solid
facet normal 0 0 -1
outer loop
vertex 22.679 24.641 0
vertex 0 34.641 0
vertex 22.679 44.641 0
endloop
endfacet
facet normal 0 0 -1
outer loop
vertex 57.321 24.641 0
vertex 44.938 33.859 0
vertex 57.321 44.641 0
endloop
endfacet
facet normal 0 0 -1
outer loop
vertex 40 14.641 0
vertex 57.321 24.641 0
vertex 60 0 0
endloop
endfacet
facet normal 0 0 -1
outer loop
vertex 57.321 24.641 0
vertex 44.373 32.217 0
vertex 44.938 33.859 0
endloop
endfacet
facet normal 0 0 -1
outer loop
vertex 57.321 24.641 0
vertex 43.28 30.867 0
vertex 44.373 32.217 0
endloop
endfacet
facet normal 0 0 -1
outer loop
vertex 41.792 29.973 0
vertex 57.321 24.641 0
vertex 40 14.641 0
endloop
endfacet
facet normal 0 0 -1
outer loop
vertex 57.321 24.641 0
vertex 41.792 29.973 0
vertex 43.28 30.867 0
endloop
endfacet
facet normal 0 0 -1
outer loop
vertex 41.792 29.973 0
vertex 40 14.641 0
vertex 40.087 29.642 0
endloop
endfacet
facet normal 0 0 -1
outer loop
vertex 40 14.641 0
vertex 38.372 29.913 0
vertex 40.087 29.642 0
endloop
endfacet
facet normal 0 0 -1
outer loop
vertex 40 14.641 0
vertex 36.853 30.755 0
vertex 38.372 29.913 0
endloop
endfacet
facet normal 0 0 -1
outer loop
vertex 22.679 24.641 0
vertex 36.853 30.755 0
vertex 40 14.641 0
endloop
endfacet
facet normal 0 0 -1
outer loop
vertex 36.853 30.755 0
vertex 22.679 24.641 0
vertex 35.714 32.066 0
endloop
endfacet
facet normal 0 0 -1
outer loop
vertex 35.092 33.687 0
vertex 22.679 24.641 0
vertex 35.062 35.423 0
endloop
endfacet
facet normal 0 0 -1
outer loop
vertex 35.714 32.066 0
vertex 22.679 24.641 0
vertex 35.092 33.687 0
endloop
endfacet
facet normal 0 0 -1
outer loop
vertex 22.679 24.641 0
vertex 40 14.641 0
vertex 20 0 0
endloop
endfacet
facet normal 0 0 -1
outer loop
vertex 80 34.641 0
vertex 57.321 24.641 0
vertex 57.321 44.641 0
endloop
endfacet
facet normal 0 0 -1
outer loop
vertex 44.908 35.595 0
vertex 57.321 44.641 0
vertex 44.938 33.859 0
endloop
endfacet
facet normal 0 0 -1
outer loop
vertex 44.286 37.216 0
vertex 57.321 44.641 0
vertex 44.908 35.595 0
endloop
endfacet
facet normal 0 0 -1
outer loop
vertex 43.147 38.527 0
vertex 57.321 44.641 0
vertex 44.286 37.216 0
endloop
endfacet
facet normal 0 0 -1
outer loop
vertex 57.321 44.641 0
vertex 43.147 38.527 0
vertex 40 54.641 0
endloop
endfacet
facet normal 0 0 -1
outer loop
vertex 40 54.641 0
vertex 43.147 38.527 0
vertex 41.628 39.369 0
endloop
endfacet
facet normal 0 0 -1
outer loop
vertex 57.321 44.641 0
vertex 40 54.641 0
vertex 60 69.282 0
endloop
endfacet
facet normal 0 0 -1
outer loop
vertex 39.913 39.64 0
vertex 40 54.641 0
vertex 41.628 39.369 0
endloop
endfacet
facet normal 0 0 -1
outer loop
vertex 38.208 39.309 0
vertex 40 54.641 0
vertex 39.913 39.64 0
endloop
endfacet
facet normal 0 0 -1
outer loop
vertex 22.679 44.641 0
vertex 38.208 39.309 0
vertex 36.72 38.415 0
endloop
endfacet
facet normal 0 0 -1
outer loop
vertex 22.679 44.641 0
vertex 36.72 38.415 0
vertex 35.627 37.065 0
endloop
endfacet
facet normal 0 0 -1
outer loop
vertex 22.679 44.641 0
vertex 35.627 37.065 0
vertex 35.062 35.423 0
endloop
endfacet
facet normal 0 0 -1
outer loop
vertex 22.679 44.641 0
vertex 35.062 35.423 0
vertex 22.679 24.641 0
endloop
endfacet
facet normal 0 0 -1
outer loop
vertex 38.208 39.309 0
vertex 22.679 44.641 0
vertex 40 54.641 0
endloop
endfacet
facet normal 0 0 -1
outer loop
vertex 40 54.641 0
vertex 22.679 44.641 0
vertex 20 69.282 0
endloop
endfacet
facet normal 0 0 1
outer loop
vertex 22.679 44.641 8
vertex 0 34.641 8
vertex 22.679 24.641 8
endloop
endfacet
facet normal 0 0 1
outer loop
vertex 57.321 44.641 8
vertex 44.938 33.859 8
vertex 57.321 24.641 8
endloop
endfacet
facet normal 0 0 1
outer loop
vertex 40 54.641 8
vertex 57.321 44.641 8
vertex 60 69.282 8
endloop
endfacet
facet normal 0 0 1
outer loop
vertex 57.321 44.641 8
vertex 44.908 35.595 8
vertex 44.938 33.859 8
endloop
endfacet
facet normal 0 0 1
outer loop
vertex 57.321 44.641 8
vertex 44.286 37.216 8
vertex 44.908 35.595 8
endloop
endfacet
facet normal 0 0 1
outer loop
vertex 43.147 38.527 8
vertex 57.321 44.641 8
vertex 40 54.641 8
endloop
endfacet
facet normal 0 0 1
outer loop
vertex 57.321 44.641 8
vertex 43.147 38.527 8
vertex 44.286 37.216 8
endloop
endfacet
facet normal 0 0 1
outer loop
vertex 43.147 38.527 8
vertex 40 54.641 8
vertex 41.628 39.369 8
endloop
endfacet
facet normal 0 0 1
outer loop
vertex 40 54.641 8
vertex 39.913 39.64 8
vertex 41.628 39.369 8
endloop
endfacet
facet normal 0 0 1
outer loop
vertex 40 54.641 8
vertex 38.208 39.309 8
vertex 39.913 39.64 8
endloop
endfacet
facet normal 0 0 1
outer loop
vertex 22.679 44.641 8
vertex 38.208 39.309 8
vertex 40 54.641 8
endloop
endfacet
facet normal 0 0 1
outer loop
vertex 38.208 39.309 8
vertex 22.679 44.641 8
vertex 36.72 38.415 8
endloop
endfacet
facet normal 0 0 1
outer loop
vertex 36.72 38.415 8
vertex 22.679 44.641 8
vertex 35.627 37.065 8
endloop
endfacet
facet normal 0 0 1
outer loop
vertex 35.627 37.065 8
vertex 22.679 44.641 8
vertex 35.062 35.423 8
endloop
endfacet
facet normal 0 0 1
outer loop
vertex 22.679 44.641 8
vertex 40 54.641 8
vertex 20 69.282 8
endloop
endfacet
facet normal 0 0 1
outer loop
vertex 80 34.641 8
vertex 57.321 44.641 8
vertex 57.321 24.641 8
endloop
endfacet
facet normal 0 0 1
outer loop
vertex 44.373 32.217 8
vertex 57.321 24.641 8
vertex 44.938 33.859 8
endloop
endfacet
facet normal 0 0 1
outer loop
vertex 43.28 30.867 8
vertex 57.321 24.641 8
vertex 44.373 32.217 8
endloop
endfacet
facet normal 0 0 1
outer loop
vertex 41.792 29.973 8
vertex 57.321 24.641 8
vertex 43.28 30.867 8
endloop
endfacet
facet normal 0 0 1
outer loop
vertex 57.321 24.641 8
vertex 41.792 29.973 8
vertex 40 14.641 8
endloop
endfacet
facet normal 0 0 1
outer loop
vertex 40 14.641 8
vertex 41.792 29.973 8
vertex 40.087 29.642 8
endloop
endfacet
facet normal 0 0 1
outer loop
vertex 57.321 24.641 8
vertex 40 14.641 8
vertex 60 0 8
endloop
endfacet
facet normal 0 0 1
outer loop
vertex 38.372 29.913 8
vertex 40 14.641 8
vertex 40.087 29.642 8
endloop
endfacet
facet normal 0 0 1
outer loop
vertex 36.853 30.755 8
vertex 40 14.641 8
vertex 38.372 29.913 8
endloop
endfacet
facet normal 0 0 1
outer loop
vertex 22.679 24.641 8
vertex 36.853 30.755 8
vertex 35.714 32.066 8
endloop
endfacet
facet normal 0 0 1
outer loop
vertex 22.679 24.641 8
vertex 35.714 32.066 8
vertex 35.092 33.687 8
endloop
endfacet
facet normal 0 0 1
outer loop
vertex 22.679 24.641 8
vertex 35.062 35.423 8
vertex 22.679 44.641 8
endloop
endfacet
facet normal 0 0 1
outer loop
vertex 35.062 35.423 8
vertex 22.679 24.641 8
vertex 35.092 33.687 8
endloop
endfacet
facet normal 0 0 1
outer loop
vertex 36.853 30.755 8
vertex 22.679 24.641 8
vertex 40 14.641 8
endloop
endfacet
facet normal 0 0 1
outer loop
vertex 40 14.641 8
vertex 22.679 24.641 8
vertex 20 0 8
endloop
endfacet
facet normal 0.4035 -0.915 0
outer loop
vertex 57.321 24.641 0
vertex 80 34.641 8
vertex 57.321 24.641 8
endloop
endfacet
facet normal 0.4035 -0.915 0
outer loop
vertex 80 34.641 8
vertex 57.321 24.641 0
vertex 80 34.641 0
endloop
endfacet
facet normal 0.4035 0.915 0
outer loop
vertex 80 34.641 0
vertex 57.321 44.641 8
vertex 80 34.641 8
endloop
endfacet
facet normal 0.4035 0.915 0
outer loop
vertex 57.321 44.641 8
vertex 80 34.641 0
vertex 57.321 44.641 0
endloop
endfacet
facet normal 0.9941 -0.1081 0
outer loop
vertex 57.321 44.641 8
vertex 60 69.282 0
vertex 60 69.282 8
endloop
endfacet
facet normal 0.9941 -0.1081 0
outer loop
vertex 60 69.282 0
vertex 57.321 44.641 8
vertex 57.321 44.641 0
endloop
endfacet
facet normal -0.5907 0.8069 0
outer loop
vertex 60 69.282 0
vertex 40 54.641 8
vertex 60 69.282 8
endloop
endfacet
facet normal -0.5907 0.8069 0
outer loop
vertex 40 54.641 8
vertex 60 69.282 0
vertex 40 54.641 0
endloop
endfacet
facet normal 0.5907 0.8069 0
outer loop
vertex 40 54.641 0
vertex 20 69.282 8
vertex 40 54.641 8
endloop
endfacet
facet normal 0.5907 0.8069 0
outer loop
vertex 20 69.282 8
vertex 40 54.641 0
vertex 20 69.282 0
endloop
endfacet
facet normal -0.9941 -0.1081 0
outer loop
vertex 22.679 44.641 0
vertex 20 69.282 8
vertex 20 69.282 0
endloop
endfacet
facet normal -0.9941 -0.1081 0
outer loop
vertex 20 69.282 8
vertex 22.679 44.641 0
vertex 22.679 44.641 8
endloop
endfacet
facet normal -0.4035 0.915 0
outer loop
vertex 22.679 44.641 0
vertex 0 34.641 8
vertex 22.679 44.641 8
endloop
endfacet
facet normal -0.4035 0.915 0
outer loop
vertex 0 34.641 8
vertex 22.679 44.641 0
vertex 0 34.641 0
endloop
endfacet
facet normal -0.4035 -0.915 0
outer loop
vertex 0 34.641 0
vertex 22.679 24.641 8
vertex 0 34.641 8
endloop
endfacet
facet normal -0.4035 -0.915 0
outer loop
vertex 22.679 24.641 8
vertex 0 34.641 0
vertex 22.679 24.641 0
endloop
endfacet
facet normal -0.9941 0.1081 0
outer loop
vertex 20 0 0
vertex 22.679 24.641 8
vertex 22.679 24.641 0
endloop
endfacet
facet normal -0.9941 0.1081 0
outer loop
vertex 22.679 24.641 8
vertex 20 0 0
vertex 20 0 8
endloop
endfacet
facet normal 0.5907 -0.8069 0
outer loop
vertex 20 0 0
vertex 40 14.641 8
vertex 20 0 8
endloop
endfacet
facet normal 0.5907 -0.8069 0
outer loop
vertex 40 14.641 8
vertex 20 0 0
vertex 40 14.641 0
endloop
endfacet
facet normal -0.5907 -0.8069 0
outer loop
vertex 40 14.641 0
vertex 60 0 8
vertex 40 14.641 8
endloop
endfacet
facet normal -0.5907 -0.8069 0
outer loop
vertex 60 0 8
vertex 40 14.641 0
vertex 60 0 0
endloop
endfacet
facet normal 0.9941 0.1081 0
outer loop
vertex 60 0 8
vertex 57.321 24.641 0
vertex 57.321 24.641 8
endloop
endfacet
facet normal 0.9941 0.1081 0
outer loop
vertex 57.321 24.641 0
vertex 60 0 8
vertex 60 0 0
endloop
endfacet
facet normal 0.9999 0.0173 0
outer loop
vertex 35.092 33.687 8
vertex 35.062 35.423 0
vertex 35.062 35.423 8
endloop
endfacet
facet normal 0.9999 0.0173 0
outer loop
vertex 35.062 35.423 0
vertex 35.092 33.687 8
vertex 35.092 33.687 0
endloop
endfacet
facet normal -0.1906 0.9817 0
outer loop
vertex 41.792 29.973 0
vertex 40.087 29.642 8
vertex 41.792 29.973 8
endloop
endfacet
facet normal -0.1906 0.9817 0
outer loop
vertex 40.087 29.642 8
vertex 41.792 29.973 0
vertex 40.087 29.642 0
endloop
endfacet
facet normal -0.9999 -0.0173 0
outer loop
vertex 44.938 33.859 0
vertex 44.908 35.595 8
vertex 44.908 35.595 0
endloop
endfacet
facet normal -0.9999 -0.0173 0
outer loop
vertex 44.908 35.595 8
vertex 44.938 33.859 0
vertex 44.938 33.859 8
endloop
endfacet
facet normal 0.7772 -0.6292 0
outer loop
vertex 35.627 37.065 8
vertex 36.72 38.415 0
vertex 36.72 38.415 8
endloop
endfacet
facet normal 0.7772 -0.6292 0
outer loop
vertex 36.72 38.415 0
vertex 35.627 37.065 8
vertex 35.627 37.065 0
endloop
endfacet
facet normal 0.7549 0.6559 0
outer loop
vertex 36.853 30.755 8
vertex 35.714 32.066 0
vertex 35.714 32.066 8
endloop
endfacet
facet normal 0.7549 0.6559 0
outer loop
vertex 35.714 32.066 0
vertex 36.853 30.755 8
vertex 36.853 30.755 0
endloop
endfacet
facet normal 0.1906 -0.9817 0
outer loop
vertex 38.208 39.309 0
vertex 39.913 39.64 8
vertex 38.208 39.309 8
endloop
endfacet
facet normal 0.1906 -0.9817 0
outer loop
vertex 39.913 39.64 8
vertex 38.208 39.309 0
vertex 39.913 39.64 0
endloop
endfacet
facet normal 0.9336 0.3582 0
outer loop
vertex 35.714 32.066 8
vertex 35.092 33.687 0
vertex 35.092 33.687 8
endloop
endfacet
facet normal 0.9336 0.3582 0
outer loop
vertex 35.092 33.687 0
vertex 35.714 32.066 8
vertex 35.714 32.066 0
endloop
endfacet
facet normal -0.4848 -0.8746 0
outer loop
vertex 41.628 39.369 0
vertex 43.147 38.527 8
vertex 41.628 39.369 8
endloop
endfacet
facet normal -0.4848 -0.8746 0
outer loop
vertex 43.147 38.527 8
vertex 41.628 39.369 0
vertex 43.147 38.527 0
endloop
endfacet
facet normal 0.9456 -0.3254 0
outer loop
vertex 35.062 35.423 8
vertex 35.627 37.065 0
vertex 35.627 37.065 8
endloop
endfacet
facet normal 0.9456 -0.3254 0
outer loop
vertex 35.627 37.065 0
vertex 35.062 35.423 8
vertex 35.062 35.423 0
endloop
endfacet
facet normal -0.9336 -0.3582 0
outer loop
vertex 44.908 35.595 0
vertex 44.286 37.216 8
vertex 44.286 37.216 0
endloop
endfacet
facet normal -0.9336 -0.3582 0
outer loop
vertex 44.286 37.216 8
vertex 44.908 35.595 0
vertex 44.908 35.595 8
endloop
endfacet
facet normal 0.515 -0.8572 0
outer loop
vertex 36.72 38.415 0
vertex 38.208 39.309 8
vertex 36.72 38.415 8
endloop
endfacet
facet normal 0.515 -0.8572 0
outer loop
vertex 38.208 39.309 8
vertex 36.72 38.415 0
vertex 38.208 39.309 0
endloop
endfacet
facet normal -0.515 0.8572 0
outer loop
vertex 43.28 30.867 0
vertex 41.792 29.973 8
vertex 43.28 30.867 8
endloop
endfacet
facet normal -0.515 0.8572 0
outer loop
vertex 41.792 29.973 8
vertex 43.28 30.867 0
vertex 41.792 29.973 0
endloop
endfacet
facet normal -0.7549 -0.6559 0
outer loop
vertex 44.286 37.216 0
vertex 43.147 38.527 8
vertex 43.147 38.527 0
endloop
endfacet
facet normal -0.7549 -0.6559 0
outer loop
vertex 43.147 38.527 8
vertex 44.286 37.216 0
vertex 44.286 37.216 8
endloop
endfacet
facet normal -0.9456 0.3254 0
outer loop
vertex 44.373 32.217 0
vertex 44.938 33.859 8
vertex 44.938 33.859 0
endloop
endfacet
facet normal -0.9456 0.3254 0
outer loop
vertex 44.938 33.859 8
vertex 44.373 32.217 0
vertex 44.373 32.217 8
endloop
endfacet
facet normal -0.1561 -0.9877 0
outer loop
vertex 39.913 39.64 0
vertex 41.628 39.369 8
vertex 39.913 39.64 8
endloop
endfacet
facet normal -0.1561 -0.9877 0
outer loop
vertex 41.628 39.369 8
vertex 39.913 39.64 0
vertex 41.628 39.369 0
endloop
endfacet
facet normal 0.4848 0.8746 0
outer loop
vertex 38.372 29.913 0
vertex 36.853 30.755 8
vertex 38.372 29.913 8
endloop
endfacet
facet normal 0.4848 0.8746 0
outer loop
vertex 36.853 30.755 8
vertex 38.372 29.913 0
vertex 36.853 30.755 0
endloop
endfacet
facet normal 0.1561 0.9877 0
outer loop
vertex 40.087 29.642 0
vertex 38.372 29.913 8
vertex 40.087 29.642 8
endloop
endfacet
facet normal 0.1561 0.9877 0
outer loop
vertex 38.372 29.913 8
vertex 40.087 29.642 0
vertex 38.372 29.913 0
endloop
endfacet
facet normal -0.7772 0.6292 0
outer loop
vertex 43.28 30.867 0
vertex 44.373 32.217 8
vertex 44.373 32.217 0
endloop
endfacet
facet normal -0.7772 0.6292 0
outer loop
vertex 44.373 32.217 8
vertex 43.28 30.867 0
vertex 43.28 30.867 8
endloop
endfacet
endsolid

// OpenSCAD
$fn = 32;

// ----------------------------------------------------------------------
// Star wheel: 6-point star, R40
// ----------------------------------------------------------------------

// --- parameters (mm) ---
n_points = 6;             // number of points / teeth
r_out = 40;               // tip radius
r_in = 20;                // root radius
bore_r = 5;               // centre bore radius
plate_t = 8;              // plate thickness, Z (extrusion height)
bore_d = 10;              // centre bore diameter

profile = [[80, 34.641], [57.321, 44.641], [60, 69.282], [40, 54.641], [20, 69.282], [22.679, 44.641], [0, 34.641], [22.679, 24.641], [20, 0], [40, 14.641], [60, 0], [57.321, 24.641]];  // primary outline, 12 points, counter clockwise
void_1 = [[44.908, 35.595], [44.286, 37.216], [43.147, 38.527], [41.628, 39.369], [39.913, 39.64], [38.208, 39.309], [36.72, 38.415], [35.627, 37.065], [35.062, 35.423], [35.092, 33.687], [35.714, 32.066], [36.853, 30.755], [38.372, 29.913], [40.087, 29.642], [41.792, 29.973], [43.28, 30.867], [44.373, 32.217], [44.938, 33.859]];  // centre bore, 18 points

// --- the one profile operation ---
difference() {
  linear_extrude(height = plate_t) polygon(points = profile);
  translate([0, 0, -1])
    linear_extrude(height = plate_t + 2) polygon(points = void_1);
}
